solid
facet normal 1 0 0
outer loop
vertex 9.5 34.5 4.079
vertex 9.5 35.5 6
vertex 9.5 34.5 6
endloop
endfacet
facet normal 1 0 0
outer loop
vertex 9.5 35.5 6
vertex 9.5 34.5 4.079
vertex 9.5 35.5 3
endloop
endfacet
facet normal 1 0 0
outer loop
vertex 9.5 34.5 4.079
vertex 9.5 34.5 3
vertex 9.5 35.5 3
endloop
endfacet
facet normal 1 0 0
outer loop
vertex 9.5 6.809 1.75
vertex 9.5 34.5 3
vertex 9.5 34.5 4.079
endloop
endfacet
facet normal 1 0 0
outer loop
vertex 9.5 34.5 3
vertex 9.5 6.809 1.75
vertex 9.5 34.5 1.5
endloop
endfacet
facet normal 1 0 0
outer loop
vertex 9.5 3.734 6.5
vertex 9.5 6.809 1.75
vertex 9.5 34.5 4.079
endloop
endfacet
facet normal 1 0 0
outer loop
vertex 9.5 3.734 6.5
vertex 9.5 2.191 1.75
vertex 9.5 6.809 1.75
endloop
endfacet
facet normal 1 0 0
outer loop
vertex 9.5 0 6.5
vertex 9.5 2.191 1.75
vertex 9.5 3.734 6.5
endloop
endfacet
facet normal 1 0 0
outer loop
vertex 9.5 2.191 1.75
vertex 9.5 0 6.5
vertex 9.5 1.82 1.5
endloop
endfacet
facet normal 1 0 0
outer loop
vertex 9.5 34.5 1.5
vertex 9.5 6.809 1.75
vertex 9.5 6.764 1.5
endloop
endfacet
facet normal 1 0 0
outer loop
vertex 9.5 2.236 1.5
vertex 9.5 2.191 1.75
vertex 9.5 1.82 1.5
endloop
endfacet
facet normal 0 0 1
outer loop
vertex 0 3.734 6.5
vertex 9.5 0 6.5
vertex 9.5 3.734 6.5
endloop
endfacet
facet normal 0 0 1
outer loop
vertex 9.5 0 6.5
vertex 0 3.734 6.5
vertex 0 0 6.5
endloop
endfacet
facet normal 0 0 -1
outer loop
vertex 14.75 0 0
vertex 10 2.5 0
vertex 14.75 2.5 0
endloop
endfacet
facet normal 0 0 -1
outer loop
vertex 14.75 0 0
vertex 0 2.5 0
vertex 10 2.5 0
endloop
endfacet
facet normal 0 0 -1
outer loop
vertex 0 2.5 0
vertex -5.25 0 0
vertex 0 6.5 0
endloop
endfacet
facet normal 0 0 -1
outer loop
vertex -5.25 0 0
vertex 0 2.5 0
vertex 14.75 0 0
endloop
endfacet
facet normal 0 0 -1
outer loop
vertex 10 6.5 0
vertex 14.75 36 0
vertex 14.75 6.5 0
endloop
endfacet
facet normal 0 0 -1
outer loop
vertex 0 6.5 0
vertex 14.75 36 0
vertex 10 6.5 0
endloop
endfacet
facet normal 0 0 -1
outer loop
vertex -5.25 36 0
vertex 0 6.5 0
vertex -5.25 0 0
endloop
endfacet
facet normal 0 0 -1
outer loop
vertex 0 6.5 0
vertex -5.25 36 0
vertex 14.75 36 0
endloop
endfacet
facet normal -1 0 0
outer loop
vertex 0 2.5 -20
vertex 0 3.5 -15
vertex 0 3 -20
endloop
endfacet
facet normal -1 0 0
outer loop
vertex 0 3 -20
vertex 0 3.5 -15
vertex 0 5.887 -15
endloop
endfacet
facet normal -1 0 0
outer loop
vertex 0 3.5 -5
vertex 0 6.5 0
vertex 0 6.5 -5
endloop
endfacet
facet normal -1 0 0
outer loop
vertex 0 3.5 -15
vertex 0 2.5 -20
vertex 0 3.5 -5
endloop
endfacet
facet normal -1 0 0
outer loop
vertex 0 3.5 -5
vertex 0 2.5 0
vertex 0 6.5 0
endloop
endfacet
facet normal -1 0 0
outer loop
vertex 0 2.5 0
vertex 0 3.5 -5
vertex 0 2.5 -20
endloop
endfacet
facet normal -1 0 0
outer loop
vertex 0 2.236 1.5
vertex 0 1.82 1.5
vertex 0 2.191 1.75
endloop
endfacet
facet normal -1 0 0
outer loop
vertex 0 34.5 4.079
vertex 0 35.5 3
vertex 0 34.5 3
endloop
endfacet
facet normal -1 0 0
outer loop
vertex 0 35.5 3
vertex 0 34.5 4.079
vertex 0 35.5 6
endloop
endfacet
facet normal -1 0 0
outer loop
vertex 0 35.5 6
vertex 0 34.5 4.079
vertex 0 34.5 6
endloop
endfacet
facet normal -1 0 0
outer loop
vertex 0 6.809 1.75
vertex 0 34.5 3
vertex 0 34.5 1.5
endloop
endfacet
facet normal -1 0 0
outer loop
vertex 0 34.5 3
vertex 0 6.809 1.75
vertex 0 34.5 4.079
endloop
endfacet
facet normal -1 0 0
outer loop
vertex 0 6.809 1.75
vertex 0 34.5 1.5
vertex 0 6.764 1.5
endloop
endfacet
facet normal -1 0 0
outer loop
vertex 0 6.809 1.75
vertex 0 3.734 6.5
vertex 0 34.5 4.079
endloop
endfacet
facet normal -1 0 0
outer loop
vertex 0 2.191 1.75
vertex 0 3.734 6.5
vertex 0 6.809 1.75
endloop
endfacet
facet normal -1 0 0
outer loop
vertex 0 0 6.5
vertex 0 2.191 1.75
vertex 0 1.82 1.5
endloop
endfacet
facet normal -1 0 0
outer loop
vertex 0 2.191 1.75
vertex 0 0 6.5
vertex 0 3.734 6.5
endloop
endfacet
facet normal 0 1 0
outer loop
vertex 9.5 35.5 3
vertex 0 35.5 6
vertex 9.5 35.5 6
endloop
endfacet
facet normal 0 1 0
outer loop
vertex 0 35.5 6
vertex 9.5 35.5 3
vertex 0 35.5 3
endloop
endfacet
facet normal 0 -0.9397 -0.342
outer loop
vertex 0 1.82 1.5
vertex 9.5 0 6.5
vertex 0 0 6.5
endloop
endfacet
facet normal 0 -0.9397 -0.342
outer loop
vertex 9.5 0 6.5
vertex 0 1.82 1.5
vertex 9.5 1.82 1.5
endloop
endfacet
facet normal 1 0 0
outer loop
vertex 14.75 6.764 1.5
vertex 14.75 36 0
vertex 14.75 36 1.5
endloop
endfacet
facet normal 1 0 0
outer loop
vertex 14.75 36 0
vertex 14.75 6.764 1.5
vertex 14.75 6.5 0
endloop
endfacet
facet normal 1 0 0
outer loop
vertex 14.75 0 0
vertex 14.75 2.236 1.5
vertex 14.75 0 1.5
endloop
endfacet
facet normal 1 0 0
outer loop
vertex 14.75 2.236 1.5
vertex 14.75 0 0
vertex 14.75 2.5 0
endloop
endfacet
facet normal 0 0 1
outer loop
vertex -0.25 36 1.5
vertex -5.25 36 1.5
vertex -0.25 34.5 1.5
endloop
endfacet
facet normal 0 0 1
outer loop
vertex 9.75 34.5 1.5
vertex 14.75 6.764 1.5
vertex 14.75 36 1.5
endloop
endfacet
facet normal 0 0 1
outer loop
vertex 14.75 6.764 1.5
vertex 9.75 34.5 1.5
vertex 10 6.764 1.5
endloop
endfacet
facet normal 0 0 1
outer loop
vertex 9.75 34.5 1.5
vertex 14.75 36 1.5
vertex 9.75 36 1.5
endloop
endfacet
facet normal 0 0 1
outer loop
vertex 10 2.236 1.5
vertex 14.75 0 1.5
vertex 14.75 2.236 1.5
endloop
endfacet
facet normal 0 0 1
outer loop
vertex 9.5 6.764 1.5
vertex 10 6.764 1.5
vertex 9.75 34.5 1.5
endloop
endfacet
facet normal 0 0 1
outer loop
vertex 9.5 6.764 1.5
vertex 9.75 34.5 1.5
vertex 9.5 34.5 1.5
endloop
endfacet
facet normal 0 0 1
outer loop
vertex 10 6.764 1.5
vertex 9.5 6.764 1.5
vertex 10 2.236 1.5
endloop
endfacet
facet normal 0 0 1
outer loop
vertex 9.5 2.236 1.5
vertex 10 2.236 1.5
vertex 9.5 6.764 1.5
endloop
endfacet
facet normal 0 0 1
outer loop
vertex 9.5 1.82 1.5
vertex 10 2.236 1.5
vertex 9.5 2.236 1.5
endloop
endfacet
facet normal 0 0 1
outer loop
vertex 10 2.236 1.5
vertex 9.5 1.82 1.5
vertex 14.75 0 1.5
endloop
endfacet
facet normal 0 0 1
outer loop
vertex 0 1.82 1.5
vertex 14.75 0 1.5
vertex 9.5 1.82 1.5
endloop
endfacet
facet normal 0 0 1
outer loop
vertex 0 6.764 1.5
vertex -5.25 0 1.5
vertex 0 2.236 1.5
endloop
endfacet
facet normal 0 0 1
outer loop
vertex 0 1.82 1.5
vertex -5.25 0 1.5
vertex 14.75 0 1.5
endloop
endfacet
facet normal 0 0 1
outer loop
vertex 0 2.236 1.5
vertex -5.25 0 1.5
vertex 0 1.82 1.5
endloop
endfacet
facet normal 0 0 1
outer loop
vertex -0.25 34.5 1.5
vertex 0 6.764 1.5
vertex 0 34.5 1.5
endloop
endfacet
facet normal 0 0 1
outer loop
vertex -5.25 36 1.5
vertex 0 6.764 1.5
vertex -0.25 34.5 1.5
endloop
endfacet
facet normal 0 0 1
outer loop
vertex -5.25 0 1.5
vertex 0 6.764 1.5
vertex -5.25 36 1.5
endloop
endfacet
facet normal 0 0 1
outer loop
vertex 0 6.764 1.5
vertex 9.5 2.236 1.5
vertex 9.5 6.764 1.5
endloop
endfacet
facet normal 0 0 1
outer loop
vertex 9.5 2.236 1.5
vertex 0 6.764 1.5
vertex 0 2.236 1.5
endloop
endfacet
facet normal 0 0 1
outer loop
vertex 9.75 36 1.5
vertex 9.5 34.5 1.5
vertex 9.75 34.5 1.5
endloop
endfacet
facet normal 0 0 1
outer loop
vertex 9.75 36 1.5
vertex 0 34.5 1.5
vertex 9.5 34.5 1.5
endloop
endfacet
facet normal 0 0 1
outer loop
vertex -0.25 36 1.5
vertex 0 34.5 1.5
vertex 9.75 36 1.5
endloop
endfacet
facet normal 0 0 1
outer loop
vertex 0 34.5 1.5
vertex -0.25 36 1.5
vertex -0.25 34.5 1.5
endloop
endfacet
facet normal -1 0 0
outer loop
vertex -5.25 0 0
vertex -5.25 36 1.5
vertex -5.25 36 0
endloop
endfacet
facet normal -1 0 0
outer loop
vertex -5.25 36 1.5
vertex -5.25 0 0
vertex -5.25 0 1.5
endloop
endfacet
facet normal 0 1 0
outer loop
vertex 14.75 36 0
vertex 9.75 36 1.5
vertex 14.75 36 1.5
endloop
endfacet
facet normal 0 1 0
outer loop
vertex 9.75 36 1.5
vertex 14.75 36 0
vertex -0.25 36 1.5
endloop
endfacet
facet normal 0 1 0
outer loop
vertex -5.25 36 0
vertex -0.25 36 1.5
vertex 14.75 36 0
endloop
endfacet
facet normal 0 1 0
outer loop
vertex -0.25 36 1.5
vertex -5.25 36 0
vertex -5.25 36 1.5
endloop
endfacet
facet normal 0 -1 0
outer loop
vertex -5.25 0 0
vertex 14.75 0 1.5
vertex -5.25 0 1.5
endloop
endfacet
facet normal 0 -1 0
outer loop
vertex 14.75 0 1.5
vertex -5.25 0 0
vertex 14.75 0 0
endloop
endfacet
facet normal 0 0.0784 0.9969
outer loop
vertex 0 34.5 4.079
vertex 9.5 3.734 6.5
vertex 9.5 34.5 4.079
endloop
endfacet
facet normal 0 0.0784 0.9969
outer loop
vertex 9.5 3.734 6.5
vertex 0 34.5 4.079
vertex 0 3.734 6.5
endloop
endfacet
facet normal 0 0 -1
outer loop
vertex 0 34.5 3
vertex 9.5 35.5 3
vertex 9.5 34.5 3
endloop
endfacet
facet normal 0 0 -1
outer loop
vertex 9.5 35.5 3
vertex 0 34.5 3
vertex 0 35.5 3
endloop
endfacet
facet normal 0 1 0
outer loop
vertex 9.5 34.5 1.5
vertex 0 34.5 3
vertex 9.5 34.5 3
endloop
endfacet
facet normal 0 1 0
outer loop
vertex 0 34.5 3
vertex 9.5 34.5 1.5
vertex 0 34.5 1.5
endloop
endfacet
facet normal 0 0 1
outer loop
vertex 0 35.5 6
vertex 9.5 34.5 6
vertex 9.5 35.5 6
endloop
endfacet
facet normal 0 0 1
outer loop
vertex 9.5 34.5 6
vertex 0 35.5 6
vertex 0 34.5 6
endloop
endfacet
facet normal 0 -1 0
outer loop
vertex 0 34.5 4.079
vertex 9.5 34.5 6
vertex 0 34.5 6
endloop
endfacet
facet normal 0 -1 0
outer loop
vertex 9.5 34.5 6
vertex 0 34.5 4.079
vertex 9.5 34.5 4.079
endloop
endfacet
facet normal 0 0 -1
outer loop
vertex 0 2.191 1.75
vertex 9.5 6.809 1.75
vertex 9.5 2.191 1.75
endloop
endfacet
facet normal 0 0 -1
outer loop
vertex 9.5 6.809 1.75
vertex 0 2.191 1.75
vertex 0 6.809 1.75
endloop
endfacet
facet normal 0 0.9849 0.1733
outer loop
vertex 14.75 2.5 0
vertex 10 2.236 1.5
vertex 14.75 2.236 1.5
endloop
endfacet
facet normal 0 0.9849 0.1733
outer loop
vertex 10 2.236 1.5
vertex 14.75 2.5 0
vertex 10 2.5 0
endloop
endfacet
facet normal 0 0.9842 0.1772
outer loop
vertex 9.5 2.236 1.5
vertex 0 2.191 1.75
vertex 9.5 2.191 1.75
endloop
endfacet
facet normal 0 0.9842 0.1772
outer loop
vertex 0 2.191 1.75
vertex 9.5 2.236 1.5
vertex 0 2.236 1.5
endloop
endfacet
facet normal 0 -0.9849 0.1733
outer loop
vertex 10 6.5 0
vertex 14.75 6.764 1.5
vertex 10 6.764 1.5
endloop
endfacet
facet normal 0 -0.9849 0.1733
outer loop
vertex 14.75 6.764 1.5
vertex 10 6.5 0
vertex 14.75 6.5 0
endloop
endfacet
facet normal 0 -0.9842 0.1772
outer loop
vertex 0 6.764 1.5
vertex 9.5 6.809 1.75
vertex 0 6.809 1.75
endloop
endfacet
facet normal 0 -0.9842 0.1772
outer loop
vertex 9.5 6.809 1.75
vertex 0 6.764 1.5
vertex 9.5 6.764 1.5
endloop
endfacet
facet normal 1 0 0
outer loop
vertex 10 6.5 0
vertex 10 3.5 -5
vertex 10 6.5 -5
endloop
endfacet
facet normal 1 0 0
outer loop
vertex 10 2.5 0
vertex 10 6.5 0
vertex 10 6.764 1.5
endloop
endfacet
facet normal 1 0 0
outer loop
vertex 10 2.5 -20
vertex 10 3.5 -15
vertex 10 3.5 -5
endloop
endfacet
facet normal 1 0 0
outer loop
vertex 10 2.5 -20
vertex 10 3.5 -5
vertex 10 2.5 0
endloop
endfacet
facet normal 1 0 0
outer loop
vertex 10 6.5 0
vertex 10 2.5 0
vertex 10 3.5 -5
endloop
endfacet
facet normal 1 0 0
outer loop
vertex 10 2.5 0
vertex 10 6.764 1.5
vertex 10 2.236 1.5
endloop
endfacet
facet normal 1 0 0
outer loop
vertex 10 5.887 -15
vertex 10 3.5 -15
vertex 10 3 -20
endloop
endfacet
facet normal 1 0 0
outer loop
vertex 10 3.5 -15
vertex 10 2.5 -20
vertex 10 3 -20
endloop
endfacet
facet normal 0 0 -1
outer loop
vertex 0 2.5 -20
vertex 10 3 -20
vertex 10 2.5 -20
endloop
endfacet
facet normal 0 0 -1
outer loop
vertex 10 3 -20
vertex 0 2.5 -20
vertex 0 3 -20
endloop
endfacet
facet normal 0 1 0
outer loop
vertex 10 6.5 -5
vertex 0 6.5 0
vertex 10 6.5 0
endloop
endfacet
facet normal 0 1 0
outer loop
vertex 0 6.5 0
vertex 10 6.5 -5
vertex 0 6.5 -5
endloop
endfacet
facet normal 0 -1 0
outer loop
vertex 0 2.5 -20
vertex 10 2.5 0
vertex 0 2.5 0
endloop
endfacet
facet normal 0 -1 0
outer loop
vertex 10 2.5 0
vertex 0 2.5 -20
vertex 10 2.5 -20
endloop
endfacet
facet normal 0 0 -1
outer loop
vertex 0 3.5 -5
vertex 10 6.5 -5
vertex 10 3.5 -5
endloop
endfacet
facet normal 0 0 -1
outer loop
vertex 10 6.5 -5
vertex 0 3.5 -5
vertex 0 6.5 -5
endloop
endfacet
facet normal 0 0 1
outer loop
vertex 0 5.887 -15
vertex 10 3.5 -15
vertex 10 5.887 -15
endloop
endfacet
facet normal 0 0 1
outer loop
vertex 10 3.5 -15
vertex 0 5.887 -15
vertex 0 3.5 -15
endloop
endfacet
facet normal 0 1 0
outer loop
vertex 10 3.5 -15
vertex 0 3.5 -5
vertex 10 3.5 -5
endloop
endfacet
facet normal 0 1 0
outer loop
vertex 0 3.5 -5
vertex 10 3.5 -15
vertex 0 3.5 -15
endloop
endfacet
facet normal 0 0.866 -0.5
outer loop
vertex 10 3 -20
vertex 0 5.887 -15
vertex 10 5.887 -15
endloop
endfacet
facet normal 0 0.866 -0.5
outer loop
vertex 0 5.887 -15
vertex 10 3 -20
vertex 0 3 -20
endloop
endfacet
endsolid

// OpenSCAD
$fn = 120;

union() {
	difference() {
		union() {
			difference() {
				union() {
					difference() {
						cube(size = [9.5, 35.5, 6.5]);
						translate(v = [0, 0, 6.5]) {
							rotate(a = [20, 0, 0]) {
								translate(v = [-0.25, -7.2, -6.5]) {
									cube(size = [10, 7.2, 6.5]);
								}
							}
						}
					}
					translate(v = [-5.25, 0, 0]) {
						cube(size = [20, 36, 1.5]);
					}
				}
				translate(v = [-0.25, 35.5, 4.0]) {
					rotate(a = [-4.5, 0, 0]) {
						translate(v = [0, -35.5, 0]) {
							cube(size = [10, 35.5, 5]);
						}
					}
				}
				translate(v = [-0.25, 34.5, 1.5]) {
					cube(size = [10, 1.5, 1.5]);
				}
			}
			translate(v = [0, 34.5, 3.0]) {
				cube(size = [9.5, 1.0, 3.0]);
			}
		}
		translate(v = [0, 2.5, 0]) {
			difference() {
				translate(v = [0, -1, -0.25]) {
					cube(size = [15, 6, 2.0]);
				}
				rotate(a = [10, 0, 0]) {
					translate(v = [-0.25, -2, 0]) {
						cube(size = [15.5, 2, 2]);
					}
				}
				translate(v = [-0.25, 4, 0]) {
					rotate(a = [-10, 0, 0]) {
						cube(size = [15.5, 2, 2]);
					}
				}
			}
		}
	}
	translate(v = [0, 2.5, -20]) {
		union() {
			difference() {
				cube(size = [10, 4, 20.5]);
				translate(v = [-0.25, 1, 5]) {
					cube(size = [10.5, 10, 10]);
				}
				translate(v = [-0.25, 0.5, 0]) {
					rotate(a = [-30, 0, 0]) {
						cube(size = [10.5, 5, 10]);
					}
				}
			}
			translate(v = [0, 0, 20]) {
				difference() {
					translate(v = [0, -1, -0.0]) {
						cube(size = [10, 6, 1.5]);
					}
					rotate(a = [10, 0, 0]) {
						translate(v = [-0.25, -2, 0]) {
							cube(size = [10.5, 2, 2]);
						}
					}
					translate(v = [-0.25, 4, 0]) {
						rotate(a = [-10, 0, 0]) {
							cube(size = [10.5, 2, 2]);
						}
					}
				}
			}
		}
	}
}
